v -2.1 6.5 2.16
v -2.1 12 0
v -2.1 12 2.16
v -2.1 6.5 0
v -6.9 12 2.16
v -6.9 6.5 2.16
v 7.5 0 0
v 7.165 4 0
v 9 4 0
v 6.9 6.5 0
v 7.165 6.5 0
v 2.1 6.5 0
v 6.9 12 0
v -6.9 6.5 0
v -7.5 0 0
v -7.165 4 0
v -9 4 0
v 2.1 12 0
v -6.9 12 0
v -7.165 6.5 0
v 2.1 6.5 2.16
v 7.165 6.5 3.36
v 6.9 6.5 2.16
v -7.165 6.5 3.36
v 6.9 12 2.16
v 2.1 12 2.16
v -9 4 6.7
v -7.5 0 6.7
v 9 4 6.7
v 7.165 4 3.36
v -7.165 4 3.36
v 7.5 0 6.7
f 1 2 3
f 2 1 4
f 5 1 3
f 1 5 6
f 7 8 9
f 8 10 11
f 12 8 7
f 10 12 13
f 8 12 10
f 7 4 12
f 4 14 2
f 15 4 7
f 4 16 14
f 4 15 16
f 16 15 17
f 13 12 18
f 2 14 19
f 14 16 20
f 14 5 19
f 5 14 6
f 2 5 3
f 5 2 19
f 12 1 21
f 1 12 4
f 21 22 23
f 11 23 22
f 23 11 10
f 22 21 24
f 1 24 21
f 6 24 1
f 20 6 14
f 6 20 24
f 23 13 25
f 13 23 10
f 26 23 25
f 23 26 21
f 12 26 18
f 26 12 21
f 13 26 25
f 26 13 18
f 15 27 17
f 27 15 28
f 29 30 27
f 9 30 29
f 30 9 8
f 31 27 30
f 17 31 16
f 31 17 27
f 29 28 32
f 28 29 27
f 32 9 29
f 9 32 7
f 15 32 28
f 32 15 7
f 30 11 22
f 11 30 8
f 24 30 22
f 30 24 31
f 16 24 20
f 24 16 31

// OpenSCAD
base_width = 4;
middle_width = 2.5;

part();


module part(){
	base();
	middle();
	connectors();
}


module connectors(){
	height = 2.16;
	width = 5.5;
	
	xAbs = 4.5;
	for(x = [-xAbs, xAbs]){
		translate([x, base_width+middle_width+width/2, height/2])
			cube([4.8, width, height], center=true);
	}
}


module middle(){
	height = 3.36;
	translate([0, base_width+middle_width/2, height/2])
		cube([14.33, middle_width, height], center=true);
}


module base(){
	linear_extrude(6.7){
		base_2d_half();
		mirror([1, 0, 0]) base_2d_half();
	}

	module base_2d_half(){
		polygon([[0,0], [7.5,0], [9,base_width], [0,base_width]]);
	}	
}
